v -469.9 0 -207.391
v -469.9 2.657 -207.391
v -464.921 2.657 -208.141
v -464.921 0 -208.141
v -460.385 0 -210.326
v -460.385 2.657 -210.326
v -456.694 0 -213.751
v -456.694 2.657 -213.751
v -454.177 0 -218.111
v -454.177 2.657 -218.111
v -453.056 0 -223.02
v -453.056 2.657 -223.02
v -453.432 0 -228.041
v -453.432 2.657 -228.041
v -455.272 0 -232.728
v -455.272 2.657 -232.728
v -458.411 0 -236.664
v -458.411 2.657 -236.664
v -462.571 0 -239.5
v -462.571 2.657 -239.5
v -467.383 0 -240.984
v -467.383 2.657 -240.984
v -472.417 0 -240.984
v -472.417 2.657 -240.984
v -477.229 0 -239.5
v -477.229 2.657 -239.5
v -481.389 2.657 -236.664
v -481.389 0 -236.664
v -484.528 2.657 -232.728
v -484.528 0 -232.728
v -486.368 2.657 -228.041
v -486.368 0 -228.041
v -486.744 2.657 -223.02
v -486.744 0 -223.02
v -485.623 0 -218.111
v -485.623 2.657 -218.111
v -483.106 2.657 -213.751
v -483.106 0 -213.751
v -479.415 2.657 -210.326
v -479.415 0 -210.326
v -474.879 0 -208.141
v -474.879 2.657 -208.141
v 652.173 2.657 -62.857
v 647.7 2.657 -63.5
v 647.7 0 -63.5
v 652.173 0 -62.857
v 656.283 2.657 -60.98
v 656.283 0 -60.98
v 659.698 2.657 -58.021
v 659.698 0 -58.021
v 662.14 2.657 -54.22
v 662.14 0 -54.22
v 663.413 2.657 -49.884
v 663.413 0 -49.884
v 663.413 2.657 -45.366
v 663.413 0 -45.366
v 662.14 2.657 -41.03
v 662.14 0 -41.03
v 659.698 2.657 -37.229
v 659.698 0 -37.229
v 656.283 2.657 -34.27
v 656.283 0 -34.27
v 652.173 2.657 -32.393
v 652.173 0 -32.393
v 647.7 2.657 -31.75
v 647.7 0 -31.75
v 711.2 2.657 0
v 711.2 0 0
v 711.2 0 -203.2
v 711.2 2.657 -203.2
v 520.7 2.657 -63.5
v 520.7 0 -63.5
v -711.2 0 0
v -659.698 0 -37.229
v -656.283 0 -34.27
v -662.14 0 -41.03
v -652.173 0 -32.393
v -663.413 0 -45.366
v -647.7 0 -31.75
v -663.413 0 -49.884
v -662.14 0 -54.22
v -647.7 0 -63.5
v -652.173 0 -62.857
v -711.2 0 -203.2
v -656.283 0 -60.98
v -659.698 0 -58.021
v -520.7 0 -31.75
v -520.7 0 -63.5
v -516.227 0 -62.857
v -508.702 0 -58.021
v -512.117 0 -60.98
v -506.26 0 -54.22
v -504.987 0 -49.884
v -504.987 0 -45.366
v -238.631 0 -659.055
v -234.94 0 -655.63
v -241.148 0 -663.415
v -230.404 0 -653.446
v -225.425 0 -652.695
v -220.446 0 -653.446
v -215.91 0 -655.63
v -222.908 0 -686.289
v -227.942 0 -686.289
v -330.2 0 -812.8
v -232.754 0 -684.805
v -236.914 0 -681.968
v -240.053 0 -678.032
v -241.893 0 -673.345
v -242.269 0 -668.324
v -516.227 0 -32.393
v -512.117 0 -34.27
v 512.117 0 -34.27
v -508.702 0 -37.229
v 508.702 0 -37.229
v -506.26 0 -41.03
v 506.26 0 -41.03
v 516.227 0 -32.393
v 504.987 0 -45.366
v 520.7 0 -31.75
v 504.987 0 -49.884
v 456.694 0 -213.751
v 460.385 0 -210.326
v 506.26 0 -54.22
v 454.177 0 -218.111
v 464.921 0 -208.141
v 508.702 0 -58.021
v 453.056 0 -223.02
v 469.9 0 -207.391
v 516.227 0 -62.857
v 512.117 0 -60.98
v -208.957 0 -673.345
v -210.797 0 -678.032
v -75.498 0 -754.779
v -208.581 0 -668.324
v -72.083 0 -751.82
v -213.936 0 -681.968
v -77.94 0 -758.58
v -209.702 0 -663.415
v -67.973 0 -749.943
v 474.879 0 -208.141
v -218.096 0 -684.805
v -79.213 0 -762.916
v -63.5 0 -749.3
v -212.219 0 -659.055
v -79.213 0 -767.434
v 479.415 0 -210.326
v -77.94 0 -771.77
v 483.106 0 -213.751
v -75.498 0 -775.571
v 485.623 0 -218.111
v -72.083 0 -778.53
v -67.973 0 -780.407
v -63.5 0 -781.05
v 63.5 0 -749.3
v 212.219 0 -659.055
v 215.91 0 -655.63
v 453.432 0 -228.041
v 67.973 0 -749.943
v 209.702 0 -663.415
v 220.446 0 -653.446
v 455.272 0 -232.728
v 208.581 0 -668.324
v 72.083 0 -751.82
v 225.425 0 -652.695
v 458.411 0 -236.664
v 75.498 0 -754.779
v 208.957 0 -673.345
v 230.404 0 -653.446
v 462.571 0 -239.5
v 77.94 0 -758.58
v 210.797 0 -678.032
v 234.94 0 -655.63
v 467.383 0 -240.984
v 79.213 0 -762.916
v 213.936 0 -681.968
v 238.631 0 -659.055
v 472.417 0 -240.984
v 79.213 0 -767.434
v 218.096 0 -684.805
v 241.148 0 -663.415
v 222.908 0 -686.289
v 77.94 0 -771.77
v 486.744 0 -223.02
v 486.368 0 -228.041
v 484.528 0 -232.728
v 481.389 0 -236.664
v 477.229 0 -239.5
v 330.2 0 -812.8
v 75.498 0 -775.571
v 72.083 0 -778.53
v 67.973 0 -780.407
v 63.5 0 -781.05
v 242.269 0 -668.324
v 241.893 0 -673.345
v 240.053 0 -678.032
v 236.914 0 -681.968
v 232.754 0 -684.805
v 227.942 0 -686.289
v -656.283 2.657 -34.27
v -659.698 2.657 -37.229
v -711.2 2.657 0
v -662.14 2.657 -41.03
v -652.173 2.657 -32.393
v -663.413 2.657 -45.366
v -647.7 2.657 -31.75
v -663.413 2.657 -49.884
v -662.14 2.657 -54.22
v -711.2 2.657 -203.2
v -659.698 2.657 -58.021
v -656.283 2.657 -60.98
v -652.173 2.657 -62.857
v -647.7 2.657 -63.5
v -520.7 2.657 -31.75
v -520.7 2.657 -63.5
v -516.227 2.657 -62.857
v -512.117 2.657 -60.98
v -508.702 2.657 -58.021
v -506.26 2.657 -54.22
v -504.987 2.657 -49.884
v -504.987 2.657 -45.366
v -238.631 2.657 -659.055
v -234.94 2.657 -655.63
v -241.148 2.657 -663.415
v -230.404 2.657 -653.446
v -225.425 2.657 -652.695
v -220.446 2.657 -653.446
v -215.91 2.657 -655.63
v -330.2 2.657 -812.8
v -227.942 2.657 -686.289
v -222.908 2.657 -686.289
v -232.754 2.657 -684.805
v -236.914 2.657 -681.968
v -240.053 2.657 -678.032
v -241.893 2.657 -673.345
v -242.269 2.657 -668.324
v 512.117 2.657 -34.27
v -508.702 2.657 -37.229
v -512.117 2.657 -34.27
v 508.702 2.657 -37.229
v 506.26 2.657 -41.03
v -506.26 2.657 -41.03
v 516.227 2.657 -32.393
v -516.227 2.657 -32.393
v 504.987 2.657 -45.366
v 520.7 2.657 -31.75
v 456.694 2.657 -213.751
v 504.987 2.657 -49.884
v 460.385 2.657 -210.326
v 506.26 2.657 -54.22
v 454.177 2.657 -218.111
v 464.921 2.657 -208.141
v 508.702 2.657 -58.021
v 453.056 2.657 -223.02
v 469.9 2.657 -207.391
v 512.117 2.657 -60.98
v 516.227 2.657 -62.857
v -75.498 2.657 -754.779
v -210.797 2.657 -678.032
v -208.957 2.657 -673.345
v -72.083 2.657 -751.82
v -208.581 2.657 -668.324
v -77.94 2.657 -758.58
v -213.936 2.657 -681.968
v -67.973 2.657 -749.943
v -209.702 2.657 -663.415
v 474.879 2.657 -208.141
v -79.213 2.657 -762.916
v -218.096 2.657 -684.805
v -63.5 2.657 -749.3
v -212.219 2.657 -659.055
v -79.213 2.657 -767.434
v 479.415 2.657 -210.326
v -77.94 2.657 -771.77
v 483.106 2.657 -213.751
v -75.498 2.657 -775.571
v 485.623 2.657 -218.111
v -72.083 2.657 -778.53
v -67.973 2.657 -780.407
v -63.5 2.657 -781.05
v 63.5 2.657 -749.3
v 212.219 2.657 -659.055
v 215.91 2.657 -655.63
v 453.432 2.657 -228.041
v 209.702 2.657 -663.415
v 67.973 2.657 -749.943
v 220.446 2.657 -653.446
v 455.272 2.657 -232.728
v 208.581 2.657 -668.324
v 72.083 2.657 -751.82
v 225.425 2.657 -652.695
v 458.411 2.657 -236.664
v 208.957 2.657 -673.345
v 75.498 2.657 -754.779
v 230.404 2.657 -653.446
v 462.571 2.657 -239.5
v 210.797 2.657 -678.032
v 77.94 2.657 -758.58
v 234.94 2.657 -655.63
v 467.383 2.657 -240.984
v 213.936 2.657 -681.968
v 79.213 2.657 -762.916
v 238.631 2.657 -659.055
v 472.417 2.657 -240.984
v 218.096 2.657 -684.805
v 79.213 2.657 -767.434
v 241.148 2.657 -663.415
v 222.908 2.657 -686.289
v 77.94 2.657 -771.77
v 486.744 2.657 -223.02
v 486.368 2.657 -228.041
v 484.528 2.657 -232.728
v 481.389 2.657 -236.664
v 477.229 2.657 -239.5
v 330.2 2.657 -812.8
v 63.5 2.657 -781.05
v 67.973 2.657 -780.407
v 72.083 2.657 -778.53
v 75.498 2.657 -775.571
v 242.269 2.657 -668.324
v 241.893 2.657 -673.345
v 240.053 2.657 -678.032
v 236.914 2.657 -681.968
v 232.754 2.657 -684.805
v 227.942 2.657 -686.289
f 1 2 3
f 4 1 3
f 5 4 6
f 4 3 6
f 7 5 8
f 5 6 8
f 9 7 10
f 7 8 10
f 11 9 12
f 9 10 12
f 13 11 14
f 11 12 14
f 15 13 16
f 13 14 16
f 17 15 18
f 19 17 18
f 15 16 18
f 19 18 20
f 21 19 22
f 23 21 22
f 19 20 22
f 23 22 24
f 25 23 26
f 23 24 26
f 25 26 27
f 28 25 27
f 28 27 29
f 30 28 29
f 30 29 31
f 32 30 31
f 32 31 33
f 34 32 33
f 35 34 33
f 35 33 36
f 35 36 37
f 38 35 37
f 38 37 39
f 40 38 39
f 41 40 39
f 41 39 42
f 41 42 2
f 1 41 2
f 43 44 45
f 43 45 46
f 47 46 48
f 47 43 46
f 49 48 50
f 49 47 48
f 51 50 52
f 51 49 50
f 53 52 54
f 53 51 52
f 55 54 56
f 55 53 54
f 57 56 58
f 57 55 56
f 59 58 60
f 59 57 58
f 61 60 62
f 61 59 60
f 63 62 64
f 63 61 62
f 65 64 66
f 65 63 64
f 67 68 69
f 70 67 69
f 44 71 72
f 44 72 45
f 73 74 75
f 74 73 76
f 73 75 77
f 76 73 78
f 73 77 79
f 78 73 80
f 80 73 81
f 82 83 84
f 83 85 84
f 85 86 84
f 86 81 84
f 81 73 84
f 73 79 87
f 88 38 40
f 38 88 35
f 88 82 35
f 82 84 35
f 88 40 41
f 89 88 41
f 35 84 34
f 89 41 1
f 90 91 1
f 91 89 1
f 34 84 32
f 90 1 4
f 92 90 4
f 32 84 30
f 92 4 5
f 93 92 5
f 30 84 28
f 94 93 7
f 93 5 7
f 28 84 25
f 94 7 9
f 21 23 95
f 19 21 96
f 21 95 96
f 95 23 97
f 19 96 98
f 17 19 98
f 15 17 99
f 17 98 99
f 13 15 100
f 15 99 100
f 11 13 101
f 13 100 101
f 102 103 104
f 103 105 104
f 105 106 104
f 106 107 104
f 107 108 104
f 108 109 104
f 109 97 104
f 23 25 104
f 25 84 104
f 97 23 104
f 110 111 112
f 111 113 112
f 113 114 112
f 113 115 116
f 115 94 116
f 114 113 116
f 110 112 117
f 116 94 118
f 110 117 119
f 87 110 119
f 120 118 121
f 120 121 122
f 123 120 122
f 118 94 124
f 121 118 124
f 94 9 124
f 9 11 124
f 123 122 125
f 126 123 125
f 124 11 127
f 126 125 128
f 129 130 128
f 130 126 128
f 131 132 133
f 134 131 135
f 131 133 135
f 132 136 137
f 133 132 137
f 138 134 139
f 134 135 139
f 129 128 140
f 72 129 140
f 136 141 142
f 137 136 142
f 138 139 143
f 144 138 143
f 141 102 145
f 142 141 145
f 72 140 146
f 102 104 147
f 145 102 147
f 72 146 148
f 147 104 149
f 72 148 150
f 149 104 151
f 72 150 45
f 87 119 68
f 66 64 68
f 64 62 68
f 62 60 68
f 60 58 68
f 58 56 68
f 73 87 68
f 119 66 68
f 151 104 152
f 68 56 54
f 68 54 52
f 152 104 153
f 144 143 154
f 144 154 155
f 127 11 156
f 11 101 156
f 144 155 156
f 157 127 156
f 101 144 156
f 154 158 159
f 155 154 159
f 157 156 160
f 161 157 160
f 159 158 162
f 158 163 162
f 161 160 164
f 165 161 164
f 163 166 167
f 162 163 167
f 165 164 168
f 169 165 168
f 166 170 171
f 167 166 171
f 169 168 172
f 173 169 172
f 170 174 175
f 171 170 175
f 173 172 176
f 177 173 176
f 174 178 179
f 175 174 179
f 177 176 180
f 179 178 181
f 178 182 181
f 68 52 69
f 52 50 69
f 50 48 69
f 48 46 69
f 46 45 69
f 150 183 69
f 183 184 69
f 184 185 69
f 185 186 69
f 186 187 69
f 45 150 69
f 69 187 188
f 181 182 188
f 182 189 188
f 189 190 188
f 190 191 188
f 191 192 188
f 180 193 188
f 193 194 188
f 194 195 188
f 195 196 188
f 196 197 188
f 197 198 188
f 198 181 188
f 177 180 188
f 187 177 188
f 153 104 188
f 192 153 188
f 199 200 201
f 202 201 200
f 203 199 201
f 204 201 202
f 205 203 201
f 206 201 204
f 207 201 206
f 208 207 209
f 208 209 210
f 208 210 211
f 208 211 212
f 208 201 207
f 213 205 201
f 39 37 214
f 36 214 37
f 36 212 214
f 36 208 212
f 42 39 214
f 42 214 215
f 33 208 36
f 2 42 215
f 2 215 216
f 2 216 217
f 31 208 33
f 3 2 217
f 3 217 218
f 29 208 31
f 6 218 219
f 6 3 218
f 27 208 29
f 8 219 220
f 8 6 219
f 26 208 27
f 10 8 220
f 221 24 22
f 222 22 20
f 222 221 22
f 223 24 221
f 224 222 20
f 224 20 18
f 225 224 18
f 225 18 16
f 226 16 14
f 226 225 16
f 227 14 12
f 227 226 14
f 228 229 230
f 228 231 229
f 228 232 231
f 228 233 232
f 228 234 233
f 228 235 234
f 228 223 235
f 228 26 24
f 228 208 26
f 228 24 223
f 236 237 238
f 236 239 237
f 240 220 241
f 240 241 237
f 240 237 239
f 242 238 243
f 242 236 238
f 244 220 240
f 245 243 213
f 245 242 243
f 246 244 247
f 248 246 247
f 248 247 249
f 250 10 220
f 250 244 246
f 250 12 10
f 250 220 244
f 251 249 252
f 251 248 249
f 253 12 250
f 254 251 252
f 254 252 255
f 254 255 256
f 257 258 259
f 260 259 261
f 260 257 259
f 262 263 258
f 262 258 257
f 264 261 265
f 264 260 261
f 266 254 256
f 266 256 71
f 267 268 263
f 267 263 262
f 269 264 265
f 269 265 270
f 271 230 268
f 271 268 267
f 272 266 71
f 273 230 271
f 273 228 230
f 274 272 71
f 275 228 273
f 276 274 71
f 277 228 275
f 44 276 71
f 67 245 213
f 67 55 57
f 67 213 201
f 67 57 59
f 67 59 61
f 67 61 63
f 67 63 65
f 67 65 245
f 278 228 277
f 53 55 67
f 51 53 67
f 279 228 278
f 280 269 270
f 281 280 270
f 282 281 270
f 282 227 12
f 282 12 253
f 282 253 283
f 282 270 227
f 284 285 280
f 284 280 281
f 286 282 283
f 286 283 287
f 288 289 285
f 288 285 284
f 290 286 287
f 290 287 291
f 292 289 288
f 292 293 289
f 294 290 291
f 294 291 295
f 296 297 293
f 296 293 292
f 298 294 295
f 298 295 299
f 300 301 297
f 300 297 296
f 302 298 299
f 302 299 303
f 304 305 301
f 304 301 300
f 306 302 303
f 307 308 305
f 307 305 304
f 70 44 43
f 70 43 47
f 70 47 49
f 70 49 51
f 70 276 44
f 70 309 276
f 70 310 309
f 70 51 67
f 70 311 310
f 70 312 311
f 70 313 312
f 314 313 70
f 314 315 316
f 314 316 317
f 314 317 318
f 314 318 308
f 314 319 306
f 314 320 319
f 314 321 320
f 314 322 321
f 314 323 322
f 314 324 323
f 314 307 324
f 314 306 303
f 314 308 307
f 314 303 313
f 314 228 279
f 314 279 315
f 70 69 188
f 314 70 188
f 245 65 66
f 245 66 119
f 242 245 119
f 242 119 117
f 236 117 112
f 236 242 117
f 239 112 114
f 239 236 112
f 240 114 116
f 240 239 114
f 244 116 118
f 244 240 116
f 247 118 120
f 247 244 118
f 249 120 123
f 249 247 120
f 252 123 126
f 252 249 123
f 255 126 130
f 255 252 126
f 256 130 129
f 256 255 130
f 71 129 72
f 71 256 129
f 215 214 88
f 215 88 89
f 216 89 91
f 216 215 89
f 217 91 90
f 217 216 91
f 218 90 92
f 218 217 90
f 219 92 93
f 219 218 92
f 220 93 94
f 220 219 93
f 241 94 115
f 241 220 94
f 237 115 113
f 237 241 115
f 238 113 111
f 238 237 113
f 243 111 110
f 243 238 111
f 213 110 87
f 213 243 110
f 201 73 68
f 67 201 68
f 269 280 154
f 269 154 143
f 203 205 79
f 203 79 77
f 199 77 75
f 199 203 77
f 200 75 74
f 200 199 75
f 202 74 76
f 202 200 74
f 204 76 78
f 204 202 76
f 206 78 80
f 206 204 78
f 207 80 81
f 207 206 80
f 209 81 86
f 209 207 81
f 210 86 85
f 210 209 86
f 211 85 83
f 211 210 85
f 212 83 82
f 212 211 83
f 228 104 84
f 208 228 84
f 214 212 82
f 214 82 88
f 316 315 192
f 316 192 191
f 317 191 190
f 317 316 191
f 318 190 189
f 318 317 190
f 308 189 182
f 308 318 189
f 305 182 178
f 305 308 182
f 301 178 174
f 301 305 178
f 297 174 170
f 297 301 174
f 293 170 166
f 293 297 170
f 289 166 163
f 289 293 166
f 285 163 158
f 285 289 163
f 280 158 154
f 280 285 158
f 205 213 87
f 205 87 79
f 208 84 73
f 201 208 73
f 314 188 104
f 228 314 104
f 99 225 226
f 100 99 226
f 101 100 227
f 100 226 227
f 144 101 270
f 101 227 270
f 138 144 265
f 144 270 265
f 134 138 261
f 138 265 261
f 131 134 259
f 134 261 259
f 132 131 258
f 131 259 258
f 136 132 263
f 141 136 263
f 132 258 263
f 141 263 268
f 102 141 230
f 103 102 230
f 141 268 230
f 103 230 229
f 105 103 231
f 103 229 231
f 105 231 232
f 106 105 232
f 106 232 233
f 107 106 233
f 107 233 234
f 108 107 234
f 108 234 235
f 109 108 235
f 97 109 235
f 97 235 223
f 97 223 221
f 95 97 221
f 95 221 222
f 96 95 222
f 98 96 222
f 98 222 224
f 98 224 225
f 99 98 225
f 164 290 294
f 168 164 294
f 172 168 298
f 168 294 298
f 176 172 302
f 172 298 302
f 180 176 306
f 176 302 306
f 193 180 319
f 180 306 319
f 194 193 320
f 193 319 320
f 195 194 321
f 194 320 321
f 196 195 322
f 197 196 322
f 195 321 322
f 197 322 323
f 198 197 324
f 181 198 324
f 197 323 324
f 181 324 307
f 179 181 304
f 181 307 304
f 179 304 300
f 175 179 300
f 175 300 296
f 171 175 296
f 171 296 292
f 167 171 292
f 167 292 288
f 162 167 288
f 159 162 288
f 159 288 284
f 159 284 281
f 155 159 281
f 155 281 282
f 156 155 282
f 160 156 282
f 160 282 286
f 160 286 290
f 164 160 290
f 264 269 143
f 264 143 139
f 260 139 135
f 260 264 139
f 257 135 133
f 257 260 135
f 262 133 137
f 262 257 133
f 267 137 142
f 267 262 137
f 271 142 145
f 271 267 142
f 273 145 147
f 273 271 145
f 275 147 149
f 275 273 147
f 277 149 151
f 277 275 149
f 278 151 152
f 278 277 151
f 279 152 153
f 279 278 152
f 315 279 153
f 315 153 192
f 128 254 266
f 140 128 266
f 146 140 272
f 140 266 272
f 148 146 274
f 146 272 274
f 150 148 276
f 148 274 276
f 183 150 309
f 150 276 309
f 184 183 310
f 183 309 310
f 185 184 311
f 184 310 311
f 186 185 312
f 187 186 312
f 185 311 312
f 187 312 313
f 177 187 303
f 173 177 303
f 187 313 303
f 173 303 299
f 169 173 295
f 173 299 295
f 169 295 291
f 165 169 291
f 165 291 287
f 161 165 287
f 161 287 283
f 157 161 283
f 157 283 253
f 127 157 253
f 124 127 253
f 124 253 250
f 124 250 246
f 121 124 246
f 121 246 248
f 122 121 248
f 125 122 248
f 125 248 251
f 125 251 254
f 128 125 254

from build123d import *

# Parameters (mm, degrees)
BOSS_EXTRUDE1_DEPTH = 2.65684
CUT_EXTRUDE1_DEPTH  = 1081.026082462
SKETCH3_R           = 16.891
CUT_EXTRUDE2_DEPTH  = 1081.026082462


with BuildPart() as part:
    # Sketch1 → Boss-Extrude1 (new body)
    with BuildSketch(Plane(origin=(0, 0, 0), x_dir=(1, 0, 0), z_dir=(0, 1, 0))):
        Polygon((-711.2, 203.2), (-711.2, 0), (0, 0), (0, 812.8), (-330.2, 812.8), align=None)
        Polygon((0, 812.8), (0, 0), (711.2, 0), (711.2, 203.2), (330.2, 812.8), align=None)
    extrude(amount=BOSS_EXTRUDE1_DEPTH)

    # Sketch2 → Cut-Extrude1 (cut, through all)
    with BuildSketch(Plane(origin=(0, 2.65684, 0), x_dir=(1, 0, 0), z_dir=(0, 1, 0))):
        with BuildLine():
            Line((-63.5, 781.05), (63.5, 781.05))
            ThreePointArc((63.5, 781.05), (79.375, 765.175), (63.5, 749.3))
            Line((63.5, 749.3), (-63.5, 749.3))
            ThreePointArc((-63.5, 749.3), (-79.375, 765.175), (-63.5, 781.05))
        make_face()
        with BuildLine():
            Line((-647.7, 63.5), (-520.7, 63.5))
            ThreePointArc((-520.7, 63.5), (-504.825, 47.625), (-520.7, 31.75))
            Line((-520.7, 31.75), (-647.7, 31.75))
            ThreePointArc((-647.7, 31.75), (-663.575, 47.625), (-647.7, 63.5))
        make_face()
        with BuildLine():
            Line((520.7, 63.5), (647.7, 63.5))
            ThreePointArc((647.7, 63.5), (663.575, 47.625), (647.7, 31.75))
            Line((647.7, 31.75), (520.7, 31.75))
            ThreePointArc((520.7, 31.75), (504.825, 47.625), (520.7, 63.5))
        make_face()
    extrude(amount=-CUT_EXTRUDE1_DEPTH, mode=Mode.SUBTRACT)

    # Sketch3 → Cut-Extrude2 (cut, through all)
    with BuildSketch(Plane(origin=(0, 2.65684, 0), x_dir=(1, 0, 0), z_dir=(0, 1, 0))):
        with Locations(Location((-469.9, 224.282, 0), (0, 0, 270))):
            Circle(SKETCH3_R)
        with Locations(Location((-225.425, 669.586361505, 0), (0, 0, 270))):
            Circle(SKETCH3_R)
        with Locations(Location((225.425, 669.586361505, 0), (0, 0, 270))):
            Circle(SKETCH3_R)
        with Locations(Location((469.9, 224.282, 0), (0, 0, 270))):
            Circle(SKETCH3_R)
    extrude(amount=-CUT_EXTRUDE2_DEPTH, mode=Mode.SUBTRACT)


solid = part.part
